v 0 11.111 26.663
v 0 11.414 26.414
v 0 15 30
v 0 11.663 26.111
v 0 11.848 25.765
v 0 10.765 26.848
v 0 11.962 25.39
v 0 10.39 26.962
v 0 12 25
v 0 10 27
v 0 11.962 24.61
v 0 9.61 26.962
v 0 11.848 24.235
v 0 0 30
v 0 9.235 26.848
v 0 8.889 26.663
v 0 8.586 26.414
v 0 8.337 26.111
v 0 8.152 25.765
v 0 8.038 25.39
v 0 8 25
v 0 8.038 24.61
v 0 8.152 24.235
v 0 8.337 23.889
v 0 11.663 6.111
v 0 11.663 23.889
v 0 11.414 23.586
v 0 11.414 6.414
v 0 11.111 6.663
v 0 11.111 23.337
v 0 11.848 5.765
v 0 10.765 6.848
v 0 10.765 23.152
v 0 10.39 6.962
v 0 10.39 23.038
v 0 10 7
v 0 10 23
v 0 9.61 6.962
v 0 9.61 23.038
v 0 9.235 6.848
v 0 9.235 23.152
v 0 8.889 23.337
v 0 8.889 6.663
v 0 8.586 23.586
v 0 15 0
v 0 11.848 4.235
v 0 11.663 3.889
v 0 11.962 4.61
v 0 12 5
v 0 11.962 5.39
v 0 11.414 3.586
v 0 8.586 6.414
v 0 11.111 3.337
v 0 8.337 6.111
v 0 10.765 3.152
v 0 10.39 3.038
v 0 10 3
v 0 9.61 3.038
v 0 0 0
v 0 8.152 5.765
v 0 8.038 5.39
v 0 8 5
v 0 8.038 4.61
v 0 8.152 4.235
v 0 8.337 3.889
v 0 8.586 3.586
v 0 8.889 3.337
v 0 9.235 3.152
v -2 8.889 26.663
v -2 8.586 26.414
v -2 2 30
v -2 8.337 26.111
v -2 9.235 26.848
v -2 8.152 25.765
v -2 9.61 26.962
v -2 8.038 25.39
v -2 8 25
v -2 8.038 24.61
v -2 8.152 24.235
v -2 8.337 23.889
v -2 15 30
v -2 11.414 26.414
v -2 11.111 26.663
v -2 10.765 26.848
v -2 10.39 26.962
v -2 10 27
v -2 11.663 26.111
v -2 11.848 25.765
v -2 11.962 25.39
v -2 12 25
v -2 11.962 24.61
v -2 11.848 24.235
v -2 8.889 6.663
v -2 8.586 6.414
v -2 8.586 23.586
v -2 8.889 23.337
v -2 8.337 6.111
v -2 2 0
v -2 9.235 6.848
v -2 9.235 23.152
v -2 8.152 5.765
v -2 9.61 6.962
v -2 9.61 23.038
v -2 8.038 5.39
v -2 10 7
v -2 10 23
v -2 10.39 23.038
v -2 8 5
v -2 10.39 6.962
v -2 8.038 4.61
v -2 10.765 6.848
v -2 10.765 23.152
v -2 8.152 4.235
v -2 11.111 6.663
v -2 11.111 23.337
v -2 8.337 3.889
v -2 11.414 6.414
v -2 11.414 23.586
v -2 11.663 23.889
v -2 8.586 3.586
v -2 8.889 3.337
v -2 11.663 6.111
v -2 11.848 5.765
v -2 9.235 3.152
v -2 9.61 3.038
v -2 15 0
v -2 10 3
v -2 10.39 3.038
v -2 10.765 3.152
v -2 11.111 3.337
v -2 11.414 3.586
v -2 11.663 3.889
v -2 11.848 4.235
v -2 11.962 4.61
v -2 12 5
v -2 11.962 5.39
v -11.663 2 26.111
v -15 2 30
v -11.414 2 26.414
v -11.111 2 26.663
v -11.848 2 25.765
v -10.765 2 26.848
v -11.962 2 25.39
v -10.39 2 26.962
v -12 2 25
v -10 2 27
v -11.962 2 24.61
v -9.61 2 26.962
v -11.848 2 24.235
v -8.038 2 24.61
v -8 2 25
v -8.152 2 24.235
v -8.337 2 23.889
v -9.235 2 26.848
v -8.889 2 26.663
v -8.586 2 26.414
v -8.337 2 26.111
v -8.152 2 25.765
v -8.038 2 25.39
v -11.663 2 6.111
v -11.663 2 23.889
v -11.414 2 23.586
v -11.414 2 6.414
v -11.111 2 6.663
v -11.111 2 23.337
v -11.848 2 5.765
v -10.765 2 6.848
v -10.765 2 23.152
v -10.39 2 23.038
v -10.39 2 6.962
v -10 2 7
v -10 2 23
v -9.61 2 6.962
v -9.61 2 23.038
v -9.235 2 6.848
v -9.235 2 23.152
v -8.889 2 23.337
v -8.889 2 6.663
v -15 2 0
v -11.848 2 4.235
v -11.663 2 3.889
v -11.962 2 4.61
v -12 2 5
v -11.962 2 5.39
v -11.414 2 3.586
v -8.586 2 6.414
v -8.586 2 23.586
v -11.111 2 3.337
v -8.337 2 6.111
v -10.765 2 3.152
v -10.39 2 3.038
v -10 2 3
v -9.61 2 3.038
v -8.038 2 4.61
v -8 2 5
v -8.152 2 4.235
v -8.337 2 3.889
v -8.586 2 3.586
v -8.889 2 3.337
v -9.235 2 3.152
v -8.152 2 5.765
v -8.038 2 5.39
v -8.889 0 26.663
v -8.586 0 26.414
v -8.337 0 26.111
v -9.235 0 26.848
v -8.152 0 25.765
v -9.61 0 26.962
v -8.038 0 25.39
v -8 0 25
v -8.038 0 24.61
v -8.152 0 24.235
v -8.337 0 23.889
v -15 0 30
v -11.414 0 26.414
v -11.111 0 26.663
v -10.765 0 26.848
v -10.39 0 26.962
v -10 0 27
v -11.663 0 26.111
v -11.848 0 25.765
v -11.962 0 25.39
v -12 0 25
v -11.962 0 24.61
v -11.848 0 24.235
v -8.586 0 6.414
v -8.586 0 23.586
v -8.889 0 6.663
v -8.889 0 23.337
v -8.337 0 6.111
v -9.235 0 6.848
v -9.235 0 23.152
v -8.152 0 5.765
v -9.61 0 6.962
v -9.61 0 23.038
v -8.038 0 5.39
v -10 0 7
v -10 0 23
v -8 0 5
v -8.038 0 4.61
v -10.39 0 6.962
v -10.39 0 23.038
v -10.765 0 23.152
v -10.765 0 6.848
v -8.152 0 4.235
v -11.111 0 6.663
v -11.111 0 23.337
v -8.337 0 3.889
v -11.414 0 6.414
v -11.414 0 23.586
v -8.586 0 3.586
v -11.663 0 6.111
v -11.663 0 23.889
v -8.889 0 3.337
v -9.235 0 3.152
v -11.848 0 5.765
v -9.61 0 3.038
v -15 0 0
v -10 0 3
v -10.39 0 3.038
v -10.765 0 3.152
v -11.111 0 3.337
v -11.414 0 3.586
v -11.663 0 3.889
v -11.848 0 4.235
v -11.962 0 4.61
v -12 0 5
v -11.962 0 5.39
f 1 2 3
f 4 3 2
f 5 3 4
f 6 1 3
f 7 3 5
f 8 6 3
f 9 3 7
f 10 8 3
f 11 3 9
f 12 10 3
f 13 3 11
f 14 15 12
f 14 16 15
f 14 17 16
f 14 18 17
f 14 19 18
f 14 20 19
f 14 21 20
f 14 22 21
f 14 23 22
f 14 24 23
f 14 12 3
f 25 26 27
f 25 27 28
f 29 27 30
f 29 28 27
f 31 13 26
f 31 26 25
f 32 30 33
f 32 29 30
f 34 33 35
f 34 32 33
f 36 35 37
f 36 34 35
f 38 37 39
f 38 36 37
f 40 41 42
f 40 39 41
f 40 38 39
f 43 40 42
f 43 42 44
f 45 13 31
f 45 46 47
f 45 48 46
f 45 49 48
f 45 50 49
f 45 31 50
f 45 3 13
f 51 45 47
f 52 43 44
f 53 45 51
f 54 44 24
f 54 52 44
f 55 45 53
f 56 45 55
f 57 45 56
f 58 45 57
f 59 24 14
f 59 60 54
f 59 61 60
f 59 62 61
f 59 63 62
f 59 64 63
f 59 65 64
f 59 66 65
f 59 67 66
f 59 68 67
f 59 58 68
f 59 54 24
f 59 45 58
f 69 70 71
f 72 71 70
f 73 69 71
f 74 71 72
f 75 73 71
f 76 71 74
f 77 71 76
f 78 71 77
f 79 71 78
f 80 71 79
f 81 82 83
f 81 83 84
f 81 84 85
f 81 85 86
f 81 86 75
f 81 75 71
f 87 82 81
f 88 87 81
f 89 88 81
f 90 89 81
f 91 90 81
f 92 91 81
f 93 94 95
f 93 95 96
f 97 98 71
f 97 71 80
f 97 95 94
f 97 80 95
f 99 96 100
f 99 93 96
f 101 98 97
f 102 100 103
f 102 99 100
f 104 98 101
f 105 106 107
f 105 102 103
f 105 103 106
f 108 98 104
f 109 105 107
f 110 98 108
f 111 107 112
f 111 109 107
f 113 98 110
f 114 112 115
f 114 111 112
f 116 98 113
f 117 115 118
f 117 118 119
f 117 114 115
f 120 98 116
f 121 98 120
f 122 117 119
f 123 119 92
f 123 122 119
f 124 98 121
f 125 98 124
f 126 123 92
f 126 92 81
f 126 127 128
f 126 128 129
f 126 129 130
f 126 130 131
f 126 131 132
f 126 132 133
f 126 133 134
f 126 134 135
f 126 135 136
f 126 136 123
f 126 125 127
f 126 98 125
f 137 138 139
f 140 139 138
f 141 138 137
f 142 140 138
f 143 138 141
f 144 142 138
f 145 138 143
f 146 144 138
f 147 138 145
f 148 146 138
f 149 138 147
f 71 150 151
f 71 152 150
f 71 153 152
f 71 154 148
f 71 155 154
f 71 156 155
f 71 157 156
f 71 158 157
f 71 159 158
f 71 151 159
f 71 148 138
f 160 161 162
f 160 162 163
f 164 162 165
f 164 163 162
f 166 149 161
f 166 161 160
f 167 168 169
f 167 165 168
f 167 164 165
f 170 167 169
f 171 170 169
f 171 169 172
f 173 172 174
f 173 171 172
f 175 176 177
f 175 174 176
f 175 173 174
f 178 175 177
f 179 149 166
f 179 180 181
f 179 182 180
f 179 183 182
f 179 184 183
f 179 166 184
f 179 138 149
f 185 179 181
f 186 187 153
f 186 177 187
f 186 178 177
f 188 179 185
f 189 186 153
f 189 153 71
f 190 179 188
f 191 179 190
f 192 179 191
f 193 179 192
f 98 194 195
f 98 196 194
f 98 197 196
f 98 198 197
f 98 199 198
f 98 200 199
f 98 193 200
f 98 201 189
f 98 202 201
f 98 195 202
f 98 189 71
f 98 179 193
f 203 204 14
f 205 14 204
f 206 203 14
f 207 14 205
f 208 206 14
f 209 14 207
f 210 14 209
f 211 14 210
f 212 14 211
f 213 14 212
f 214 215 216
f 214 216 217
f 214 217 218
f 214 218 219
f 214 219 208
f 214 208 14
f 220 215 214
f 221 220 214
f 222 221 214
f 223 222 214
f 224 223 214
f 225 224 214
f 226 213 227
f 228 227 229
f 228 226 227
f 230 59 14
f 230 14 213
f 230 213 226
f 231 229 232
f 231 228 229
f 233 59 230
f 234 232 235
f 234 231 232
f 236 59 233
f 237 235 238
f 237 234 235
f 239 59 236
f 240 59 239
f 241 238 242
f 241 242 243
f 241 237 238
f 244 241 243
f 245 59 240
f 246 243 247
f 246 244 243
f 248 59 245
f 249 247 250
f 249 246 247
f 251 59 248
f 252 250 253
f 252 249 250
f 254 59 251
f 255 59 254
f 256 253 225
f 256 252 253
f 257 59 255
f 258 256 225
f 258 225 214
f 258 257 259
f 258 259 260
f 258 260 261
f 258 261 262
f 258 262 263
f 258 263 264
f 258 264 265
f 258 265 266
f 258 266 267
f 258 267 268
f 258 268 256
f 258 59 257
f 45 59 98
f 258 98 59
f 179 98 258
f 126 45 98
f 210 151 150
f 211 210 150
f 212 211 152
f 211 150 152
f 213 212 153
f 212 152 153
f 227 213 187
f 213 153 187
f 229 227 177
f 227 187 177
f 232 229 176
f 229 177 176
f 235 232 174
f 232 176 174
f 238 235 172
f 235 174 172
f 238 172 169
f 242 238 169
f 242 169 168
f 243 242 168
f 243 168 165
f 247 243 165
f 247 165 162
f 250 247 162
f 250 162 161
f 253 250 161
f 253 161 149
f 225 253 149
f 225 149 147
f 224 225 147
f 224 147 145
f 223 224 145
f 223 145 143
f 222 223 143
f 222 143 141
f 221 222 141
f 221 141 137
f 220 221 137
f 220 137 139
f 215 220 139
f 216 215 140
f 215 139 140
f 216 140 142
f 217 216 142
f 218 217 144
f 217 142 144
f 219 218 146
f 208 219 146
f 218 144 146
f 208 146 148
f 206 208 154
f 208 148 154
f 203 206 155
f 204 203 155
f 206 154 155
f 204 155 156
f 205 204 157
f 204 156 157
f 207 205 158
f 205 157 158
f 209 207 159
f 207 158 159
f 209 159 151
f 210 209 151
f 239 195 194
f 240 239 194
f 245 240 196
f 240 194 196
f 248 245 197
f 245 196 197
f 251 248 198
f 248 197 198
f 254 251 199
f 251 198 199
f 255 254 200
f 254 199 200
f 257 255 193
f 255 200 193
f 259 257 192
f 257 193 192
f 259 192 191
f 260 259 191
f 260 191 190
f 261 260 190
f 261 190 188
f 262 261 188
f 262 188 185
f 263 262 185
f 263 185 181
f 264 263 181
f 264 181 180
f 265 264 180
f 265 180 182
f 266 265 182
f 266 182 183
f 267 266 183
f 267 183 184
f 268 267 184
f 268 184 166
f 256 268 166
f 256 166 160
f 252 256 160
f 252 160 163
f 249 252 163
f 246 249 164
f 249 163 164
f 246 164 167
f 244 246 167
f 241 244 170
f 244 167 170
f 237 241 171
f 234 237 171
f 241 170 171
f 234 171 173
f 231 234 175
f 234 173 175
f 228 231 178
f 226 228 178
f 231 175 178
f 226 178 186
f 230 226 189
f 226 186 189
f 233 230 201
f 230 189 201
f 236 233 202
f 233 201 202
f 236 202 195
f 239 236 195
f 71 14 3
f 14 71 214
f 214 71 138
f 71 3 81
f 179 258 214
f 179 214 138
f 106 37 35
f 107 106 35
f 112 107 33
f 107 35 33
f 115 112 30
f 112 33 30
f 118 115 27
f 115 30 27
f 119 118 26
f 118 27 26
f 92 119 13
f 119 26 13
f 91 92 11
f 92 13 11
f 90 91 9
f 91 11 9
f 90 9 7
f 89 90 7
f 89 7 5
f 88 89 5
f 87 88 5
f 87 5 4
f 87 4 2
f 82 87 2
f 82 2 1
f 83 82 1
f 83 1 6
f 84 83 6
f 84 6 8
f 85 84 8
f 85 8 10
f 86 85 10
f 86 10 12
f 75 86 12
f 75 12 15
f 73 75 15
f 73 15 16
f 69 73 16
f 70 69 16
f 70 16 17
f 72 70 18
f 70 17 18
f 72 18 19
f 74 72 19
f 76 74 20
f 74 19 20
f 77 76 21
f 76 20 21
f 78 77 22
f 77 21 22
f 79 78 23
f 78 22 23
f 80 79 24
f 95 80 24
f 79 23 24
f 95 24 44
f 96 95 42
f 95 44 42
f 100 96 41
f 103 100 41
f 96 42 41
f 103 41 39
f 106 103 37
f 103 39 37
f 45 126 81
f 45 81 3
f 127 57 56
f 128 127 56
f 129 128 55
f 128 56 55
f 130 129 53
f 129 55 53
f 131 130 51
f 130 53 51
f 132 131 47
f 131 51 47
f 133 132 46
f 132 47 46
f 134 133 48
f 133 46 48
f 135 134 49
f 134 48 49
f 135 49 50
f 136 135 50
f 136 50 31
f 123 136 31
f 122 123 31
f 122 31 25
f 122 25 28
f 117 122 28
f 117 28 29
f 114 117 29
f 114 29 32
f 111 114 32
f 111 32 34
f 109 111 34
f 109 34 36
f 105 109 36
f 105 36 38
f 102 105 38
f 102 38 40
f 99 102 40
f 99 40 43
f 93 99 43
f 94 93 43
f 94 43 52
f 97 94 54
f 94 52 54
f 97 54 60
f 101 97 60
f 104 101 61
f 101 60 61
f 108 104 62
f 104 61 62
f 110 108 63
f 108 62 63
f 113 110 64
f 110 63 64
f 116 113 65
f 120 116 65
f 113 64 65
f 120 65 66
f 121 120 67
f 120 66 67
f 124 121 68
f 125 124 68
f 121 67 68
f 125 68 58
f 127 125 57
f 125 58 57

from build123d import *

# Parameters (mm, degrees)
BOSS_EXTRUDE1_DEPTH = 30
CUT_EXTRUDE1_REACH  = 17
SKETCH2_R           = 2
CUT_EXTRUDE2_REACH  = 4
SKETCH3_R           = 2


with BuildPart() as part:
    # Sketch1 → Boss-Extrude1 (new body)
    with BuildSketch(Plane.XY):
        Polygon((0, 15), (0, 0), (-15, 0), (-15, 2), (-2, 2), (-2, 15), align=None)
    extrude(amount=BOSS_EXTRUDE1_DEPTH)

    # Sketch2 → Cut-Extrude1 (cut, up to next)
    with BuildSketch(Plane(origin=(0, 0, 0), x_dir=(0, 0, -1), z_dir=(1, 0, 0)), mode=Mode.PRIVATE) as cut_extrude1_sk1:
        with Locations((-25, 10)):
            Circle(SKETCH2_R)
    cut_extrude1_tool1 = extrude(cut_extrude1_sk1.sketch, amount=-CUT_EXTRUDE1_REACH, mode=Mode.PRIVATE) & part.part
    add(cut_extrude1_tool1.solids().sort_by_distance((0, 10, 25))[0], mode=Mode.SUBTRACT)
    # Sketch2 → Cut-Extrude1 (cut, up to next)
    with BuildSketch(Plane(origin=(0, 0, 0), x_dir=(0, 0, -1), z_dir=(1, 0, 0)), mode=Mode.PRIVATE) as cut_extrude1_sk2:
        with Locations((-5, 10)):
            Circle(SKETCH2_R)
    cut_extrude1_tool2 = extrude(cut_extrude1_sk2.sketch, amount=-CUT_EXTRUDE1_REACH, mode=Mode.PRIVATE) & part.part
    add(cut_extrude1_tool2.solids().sort_by_distance((0, 10, 5))[0], mode=Mode.SUBTRACT)

    # Sketch3 → Cut-Extrude2 (cut, up to next)
    with BuildSketch(Plane(origin=(0, 2, 0), x_dir=(1, 0, 0), z_dir=(0, 1, 0)), mode=Mode.PRIVATE) as cut_extrude2_sk1:
        with Locations((-10, -5)):
            Circle(SKETCH3_R)
    cut_extrude2_tool1 = extrude(cut_extrude2_sk1.sketch, amount=-CUT_EXTRUDE2_REACH, mode=Mode.PRIVATE) & part.part
    add(cut_extrude2_tool1.solids().sort_by_distance((-10, 2, 5))[0], mode=Mode.SUBTRACT)
    # Sketch3 → Cut-Extrude2 (cut, up to next)
    with BuildSketch(Plane(origin=(0, 2, 0), x_dir=(1, 0, 0), z_dir=(0, 1, 0)), mode=Mode.PRIVATE) as cut_extrude2_sk2:
        with Locations((-10, -25)):
            Circle(SKETCH3_R)
    cut_extrude2_tool2 = extrude(cut_extrude2_sk2.sketch, amount=-CUT_EXTRUDE2_REACH, mode=Mode.PRIVATE) & part.part
    add(cut_extrude2_tool2.solids().sort_by_distance((-10, 2, 25))[0], mode=Mode.SUBTRACT)


solid = part.part
